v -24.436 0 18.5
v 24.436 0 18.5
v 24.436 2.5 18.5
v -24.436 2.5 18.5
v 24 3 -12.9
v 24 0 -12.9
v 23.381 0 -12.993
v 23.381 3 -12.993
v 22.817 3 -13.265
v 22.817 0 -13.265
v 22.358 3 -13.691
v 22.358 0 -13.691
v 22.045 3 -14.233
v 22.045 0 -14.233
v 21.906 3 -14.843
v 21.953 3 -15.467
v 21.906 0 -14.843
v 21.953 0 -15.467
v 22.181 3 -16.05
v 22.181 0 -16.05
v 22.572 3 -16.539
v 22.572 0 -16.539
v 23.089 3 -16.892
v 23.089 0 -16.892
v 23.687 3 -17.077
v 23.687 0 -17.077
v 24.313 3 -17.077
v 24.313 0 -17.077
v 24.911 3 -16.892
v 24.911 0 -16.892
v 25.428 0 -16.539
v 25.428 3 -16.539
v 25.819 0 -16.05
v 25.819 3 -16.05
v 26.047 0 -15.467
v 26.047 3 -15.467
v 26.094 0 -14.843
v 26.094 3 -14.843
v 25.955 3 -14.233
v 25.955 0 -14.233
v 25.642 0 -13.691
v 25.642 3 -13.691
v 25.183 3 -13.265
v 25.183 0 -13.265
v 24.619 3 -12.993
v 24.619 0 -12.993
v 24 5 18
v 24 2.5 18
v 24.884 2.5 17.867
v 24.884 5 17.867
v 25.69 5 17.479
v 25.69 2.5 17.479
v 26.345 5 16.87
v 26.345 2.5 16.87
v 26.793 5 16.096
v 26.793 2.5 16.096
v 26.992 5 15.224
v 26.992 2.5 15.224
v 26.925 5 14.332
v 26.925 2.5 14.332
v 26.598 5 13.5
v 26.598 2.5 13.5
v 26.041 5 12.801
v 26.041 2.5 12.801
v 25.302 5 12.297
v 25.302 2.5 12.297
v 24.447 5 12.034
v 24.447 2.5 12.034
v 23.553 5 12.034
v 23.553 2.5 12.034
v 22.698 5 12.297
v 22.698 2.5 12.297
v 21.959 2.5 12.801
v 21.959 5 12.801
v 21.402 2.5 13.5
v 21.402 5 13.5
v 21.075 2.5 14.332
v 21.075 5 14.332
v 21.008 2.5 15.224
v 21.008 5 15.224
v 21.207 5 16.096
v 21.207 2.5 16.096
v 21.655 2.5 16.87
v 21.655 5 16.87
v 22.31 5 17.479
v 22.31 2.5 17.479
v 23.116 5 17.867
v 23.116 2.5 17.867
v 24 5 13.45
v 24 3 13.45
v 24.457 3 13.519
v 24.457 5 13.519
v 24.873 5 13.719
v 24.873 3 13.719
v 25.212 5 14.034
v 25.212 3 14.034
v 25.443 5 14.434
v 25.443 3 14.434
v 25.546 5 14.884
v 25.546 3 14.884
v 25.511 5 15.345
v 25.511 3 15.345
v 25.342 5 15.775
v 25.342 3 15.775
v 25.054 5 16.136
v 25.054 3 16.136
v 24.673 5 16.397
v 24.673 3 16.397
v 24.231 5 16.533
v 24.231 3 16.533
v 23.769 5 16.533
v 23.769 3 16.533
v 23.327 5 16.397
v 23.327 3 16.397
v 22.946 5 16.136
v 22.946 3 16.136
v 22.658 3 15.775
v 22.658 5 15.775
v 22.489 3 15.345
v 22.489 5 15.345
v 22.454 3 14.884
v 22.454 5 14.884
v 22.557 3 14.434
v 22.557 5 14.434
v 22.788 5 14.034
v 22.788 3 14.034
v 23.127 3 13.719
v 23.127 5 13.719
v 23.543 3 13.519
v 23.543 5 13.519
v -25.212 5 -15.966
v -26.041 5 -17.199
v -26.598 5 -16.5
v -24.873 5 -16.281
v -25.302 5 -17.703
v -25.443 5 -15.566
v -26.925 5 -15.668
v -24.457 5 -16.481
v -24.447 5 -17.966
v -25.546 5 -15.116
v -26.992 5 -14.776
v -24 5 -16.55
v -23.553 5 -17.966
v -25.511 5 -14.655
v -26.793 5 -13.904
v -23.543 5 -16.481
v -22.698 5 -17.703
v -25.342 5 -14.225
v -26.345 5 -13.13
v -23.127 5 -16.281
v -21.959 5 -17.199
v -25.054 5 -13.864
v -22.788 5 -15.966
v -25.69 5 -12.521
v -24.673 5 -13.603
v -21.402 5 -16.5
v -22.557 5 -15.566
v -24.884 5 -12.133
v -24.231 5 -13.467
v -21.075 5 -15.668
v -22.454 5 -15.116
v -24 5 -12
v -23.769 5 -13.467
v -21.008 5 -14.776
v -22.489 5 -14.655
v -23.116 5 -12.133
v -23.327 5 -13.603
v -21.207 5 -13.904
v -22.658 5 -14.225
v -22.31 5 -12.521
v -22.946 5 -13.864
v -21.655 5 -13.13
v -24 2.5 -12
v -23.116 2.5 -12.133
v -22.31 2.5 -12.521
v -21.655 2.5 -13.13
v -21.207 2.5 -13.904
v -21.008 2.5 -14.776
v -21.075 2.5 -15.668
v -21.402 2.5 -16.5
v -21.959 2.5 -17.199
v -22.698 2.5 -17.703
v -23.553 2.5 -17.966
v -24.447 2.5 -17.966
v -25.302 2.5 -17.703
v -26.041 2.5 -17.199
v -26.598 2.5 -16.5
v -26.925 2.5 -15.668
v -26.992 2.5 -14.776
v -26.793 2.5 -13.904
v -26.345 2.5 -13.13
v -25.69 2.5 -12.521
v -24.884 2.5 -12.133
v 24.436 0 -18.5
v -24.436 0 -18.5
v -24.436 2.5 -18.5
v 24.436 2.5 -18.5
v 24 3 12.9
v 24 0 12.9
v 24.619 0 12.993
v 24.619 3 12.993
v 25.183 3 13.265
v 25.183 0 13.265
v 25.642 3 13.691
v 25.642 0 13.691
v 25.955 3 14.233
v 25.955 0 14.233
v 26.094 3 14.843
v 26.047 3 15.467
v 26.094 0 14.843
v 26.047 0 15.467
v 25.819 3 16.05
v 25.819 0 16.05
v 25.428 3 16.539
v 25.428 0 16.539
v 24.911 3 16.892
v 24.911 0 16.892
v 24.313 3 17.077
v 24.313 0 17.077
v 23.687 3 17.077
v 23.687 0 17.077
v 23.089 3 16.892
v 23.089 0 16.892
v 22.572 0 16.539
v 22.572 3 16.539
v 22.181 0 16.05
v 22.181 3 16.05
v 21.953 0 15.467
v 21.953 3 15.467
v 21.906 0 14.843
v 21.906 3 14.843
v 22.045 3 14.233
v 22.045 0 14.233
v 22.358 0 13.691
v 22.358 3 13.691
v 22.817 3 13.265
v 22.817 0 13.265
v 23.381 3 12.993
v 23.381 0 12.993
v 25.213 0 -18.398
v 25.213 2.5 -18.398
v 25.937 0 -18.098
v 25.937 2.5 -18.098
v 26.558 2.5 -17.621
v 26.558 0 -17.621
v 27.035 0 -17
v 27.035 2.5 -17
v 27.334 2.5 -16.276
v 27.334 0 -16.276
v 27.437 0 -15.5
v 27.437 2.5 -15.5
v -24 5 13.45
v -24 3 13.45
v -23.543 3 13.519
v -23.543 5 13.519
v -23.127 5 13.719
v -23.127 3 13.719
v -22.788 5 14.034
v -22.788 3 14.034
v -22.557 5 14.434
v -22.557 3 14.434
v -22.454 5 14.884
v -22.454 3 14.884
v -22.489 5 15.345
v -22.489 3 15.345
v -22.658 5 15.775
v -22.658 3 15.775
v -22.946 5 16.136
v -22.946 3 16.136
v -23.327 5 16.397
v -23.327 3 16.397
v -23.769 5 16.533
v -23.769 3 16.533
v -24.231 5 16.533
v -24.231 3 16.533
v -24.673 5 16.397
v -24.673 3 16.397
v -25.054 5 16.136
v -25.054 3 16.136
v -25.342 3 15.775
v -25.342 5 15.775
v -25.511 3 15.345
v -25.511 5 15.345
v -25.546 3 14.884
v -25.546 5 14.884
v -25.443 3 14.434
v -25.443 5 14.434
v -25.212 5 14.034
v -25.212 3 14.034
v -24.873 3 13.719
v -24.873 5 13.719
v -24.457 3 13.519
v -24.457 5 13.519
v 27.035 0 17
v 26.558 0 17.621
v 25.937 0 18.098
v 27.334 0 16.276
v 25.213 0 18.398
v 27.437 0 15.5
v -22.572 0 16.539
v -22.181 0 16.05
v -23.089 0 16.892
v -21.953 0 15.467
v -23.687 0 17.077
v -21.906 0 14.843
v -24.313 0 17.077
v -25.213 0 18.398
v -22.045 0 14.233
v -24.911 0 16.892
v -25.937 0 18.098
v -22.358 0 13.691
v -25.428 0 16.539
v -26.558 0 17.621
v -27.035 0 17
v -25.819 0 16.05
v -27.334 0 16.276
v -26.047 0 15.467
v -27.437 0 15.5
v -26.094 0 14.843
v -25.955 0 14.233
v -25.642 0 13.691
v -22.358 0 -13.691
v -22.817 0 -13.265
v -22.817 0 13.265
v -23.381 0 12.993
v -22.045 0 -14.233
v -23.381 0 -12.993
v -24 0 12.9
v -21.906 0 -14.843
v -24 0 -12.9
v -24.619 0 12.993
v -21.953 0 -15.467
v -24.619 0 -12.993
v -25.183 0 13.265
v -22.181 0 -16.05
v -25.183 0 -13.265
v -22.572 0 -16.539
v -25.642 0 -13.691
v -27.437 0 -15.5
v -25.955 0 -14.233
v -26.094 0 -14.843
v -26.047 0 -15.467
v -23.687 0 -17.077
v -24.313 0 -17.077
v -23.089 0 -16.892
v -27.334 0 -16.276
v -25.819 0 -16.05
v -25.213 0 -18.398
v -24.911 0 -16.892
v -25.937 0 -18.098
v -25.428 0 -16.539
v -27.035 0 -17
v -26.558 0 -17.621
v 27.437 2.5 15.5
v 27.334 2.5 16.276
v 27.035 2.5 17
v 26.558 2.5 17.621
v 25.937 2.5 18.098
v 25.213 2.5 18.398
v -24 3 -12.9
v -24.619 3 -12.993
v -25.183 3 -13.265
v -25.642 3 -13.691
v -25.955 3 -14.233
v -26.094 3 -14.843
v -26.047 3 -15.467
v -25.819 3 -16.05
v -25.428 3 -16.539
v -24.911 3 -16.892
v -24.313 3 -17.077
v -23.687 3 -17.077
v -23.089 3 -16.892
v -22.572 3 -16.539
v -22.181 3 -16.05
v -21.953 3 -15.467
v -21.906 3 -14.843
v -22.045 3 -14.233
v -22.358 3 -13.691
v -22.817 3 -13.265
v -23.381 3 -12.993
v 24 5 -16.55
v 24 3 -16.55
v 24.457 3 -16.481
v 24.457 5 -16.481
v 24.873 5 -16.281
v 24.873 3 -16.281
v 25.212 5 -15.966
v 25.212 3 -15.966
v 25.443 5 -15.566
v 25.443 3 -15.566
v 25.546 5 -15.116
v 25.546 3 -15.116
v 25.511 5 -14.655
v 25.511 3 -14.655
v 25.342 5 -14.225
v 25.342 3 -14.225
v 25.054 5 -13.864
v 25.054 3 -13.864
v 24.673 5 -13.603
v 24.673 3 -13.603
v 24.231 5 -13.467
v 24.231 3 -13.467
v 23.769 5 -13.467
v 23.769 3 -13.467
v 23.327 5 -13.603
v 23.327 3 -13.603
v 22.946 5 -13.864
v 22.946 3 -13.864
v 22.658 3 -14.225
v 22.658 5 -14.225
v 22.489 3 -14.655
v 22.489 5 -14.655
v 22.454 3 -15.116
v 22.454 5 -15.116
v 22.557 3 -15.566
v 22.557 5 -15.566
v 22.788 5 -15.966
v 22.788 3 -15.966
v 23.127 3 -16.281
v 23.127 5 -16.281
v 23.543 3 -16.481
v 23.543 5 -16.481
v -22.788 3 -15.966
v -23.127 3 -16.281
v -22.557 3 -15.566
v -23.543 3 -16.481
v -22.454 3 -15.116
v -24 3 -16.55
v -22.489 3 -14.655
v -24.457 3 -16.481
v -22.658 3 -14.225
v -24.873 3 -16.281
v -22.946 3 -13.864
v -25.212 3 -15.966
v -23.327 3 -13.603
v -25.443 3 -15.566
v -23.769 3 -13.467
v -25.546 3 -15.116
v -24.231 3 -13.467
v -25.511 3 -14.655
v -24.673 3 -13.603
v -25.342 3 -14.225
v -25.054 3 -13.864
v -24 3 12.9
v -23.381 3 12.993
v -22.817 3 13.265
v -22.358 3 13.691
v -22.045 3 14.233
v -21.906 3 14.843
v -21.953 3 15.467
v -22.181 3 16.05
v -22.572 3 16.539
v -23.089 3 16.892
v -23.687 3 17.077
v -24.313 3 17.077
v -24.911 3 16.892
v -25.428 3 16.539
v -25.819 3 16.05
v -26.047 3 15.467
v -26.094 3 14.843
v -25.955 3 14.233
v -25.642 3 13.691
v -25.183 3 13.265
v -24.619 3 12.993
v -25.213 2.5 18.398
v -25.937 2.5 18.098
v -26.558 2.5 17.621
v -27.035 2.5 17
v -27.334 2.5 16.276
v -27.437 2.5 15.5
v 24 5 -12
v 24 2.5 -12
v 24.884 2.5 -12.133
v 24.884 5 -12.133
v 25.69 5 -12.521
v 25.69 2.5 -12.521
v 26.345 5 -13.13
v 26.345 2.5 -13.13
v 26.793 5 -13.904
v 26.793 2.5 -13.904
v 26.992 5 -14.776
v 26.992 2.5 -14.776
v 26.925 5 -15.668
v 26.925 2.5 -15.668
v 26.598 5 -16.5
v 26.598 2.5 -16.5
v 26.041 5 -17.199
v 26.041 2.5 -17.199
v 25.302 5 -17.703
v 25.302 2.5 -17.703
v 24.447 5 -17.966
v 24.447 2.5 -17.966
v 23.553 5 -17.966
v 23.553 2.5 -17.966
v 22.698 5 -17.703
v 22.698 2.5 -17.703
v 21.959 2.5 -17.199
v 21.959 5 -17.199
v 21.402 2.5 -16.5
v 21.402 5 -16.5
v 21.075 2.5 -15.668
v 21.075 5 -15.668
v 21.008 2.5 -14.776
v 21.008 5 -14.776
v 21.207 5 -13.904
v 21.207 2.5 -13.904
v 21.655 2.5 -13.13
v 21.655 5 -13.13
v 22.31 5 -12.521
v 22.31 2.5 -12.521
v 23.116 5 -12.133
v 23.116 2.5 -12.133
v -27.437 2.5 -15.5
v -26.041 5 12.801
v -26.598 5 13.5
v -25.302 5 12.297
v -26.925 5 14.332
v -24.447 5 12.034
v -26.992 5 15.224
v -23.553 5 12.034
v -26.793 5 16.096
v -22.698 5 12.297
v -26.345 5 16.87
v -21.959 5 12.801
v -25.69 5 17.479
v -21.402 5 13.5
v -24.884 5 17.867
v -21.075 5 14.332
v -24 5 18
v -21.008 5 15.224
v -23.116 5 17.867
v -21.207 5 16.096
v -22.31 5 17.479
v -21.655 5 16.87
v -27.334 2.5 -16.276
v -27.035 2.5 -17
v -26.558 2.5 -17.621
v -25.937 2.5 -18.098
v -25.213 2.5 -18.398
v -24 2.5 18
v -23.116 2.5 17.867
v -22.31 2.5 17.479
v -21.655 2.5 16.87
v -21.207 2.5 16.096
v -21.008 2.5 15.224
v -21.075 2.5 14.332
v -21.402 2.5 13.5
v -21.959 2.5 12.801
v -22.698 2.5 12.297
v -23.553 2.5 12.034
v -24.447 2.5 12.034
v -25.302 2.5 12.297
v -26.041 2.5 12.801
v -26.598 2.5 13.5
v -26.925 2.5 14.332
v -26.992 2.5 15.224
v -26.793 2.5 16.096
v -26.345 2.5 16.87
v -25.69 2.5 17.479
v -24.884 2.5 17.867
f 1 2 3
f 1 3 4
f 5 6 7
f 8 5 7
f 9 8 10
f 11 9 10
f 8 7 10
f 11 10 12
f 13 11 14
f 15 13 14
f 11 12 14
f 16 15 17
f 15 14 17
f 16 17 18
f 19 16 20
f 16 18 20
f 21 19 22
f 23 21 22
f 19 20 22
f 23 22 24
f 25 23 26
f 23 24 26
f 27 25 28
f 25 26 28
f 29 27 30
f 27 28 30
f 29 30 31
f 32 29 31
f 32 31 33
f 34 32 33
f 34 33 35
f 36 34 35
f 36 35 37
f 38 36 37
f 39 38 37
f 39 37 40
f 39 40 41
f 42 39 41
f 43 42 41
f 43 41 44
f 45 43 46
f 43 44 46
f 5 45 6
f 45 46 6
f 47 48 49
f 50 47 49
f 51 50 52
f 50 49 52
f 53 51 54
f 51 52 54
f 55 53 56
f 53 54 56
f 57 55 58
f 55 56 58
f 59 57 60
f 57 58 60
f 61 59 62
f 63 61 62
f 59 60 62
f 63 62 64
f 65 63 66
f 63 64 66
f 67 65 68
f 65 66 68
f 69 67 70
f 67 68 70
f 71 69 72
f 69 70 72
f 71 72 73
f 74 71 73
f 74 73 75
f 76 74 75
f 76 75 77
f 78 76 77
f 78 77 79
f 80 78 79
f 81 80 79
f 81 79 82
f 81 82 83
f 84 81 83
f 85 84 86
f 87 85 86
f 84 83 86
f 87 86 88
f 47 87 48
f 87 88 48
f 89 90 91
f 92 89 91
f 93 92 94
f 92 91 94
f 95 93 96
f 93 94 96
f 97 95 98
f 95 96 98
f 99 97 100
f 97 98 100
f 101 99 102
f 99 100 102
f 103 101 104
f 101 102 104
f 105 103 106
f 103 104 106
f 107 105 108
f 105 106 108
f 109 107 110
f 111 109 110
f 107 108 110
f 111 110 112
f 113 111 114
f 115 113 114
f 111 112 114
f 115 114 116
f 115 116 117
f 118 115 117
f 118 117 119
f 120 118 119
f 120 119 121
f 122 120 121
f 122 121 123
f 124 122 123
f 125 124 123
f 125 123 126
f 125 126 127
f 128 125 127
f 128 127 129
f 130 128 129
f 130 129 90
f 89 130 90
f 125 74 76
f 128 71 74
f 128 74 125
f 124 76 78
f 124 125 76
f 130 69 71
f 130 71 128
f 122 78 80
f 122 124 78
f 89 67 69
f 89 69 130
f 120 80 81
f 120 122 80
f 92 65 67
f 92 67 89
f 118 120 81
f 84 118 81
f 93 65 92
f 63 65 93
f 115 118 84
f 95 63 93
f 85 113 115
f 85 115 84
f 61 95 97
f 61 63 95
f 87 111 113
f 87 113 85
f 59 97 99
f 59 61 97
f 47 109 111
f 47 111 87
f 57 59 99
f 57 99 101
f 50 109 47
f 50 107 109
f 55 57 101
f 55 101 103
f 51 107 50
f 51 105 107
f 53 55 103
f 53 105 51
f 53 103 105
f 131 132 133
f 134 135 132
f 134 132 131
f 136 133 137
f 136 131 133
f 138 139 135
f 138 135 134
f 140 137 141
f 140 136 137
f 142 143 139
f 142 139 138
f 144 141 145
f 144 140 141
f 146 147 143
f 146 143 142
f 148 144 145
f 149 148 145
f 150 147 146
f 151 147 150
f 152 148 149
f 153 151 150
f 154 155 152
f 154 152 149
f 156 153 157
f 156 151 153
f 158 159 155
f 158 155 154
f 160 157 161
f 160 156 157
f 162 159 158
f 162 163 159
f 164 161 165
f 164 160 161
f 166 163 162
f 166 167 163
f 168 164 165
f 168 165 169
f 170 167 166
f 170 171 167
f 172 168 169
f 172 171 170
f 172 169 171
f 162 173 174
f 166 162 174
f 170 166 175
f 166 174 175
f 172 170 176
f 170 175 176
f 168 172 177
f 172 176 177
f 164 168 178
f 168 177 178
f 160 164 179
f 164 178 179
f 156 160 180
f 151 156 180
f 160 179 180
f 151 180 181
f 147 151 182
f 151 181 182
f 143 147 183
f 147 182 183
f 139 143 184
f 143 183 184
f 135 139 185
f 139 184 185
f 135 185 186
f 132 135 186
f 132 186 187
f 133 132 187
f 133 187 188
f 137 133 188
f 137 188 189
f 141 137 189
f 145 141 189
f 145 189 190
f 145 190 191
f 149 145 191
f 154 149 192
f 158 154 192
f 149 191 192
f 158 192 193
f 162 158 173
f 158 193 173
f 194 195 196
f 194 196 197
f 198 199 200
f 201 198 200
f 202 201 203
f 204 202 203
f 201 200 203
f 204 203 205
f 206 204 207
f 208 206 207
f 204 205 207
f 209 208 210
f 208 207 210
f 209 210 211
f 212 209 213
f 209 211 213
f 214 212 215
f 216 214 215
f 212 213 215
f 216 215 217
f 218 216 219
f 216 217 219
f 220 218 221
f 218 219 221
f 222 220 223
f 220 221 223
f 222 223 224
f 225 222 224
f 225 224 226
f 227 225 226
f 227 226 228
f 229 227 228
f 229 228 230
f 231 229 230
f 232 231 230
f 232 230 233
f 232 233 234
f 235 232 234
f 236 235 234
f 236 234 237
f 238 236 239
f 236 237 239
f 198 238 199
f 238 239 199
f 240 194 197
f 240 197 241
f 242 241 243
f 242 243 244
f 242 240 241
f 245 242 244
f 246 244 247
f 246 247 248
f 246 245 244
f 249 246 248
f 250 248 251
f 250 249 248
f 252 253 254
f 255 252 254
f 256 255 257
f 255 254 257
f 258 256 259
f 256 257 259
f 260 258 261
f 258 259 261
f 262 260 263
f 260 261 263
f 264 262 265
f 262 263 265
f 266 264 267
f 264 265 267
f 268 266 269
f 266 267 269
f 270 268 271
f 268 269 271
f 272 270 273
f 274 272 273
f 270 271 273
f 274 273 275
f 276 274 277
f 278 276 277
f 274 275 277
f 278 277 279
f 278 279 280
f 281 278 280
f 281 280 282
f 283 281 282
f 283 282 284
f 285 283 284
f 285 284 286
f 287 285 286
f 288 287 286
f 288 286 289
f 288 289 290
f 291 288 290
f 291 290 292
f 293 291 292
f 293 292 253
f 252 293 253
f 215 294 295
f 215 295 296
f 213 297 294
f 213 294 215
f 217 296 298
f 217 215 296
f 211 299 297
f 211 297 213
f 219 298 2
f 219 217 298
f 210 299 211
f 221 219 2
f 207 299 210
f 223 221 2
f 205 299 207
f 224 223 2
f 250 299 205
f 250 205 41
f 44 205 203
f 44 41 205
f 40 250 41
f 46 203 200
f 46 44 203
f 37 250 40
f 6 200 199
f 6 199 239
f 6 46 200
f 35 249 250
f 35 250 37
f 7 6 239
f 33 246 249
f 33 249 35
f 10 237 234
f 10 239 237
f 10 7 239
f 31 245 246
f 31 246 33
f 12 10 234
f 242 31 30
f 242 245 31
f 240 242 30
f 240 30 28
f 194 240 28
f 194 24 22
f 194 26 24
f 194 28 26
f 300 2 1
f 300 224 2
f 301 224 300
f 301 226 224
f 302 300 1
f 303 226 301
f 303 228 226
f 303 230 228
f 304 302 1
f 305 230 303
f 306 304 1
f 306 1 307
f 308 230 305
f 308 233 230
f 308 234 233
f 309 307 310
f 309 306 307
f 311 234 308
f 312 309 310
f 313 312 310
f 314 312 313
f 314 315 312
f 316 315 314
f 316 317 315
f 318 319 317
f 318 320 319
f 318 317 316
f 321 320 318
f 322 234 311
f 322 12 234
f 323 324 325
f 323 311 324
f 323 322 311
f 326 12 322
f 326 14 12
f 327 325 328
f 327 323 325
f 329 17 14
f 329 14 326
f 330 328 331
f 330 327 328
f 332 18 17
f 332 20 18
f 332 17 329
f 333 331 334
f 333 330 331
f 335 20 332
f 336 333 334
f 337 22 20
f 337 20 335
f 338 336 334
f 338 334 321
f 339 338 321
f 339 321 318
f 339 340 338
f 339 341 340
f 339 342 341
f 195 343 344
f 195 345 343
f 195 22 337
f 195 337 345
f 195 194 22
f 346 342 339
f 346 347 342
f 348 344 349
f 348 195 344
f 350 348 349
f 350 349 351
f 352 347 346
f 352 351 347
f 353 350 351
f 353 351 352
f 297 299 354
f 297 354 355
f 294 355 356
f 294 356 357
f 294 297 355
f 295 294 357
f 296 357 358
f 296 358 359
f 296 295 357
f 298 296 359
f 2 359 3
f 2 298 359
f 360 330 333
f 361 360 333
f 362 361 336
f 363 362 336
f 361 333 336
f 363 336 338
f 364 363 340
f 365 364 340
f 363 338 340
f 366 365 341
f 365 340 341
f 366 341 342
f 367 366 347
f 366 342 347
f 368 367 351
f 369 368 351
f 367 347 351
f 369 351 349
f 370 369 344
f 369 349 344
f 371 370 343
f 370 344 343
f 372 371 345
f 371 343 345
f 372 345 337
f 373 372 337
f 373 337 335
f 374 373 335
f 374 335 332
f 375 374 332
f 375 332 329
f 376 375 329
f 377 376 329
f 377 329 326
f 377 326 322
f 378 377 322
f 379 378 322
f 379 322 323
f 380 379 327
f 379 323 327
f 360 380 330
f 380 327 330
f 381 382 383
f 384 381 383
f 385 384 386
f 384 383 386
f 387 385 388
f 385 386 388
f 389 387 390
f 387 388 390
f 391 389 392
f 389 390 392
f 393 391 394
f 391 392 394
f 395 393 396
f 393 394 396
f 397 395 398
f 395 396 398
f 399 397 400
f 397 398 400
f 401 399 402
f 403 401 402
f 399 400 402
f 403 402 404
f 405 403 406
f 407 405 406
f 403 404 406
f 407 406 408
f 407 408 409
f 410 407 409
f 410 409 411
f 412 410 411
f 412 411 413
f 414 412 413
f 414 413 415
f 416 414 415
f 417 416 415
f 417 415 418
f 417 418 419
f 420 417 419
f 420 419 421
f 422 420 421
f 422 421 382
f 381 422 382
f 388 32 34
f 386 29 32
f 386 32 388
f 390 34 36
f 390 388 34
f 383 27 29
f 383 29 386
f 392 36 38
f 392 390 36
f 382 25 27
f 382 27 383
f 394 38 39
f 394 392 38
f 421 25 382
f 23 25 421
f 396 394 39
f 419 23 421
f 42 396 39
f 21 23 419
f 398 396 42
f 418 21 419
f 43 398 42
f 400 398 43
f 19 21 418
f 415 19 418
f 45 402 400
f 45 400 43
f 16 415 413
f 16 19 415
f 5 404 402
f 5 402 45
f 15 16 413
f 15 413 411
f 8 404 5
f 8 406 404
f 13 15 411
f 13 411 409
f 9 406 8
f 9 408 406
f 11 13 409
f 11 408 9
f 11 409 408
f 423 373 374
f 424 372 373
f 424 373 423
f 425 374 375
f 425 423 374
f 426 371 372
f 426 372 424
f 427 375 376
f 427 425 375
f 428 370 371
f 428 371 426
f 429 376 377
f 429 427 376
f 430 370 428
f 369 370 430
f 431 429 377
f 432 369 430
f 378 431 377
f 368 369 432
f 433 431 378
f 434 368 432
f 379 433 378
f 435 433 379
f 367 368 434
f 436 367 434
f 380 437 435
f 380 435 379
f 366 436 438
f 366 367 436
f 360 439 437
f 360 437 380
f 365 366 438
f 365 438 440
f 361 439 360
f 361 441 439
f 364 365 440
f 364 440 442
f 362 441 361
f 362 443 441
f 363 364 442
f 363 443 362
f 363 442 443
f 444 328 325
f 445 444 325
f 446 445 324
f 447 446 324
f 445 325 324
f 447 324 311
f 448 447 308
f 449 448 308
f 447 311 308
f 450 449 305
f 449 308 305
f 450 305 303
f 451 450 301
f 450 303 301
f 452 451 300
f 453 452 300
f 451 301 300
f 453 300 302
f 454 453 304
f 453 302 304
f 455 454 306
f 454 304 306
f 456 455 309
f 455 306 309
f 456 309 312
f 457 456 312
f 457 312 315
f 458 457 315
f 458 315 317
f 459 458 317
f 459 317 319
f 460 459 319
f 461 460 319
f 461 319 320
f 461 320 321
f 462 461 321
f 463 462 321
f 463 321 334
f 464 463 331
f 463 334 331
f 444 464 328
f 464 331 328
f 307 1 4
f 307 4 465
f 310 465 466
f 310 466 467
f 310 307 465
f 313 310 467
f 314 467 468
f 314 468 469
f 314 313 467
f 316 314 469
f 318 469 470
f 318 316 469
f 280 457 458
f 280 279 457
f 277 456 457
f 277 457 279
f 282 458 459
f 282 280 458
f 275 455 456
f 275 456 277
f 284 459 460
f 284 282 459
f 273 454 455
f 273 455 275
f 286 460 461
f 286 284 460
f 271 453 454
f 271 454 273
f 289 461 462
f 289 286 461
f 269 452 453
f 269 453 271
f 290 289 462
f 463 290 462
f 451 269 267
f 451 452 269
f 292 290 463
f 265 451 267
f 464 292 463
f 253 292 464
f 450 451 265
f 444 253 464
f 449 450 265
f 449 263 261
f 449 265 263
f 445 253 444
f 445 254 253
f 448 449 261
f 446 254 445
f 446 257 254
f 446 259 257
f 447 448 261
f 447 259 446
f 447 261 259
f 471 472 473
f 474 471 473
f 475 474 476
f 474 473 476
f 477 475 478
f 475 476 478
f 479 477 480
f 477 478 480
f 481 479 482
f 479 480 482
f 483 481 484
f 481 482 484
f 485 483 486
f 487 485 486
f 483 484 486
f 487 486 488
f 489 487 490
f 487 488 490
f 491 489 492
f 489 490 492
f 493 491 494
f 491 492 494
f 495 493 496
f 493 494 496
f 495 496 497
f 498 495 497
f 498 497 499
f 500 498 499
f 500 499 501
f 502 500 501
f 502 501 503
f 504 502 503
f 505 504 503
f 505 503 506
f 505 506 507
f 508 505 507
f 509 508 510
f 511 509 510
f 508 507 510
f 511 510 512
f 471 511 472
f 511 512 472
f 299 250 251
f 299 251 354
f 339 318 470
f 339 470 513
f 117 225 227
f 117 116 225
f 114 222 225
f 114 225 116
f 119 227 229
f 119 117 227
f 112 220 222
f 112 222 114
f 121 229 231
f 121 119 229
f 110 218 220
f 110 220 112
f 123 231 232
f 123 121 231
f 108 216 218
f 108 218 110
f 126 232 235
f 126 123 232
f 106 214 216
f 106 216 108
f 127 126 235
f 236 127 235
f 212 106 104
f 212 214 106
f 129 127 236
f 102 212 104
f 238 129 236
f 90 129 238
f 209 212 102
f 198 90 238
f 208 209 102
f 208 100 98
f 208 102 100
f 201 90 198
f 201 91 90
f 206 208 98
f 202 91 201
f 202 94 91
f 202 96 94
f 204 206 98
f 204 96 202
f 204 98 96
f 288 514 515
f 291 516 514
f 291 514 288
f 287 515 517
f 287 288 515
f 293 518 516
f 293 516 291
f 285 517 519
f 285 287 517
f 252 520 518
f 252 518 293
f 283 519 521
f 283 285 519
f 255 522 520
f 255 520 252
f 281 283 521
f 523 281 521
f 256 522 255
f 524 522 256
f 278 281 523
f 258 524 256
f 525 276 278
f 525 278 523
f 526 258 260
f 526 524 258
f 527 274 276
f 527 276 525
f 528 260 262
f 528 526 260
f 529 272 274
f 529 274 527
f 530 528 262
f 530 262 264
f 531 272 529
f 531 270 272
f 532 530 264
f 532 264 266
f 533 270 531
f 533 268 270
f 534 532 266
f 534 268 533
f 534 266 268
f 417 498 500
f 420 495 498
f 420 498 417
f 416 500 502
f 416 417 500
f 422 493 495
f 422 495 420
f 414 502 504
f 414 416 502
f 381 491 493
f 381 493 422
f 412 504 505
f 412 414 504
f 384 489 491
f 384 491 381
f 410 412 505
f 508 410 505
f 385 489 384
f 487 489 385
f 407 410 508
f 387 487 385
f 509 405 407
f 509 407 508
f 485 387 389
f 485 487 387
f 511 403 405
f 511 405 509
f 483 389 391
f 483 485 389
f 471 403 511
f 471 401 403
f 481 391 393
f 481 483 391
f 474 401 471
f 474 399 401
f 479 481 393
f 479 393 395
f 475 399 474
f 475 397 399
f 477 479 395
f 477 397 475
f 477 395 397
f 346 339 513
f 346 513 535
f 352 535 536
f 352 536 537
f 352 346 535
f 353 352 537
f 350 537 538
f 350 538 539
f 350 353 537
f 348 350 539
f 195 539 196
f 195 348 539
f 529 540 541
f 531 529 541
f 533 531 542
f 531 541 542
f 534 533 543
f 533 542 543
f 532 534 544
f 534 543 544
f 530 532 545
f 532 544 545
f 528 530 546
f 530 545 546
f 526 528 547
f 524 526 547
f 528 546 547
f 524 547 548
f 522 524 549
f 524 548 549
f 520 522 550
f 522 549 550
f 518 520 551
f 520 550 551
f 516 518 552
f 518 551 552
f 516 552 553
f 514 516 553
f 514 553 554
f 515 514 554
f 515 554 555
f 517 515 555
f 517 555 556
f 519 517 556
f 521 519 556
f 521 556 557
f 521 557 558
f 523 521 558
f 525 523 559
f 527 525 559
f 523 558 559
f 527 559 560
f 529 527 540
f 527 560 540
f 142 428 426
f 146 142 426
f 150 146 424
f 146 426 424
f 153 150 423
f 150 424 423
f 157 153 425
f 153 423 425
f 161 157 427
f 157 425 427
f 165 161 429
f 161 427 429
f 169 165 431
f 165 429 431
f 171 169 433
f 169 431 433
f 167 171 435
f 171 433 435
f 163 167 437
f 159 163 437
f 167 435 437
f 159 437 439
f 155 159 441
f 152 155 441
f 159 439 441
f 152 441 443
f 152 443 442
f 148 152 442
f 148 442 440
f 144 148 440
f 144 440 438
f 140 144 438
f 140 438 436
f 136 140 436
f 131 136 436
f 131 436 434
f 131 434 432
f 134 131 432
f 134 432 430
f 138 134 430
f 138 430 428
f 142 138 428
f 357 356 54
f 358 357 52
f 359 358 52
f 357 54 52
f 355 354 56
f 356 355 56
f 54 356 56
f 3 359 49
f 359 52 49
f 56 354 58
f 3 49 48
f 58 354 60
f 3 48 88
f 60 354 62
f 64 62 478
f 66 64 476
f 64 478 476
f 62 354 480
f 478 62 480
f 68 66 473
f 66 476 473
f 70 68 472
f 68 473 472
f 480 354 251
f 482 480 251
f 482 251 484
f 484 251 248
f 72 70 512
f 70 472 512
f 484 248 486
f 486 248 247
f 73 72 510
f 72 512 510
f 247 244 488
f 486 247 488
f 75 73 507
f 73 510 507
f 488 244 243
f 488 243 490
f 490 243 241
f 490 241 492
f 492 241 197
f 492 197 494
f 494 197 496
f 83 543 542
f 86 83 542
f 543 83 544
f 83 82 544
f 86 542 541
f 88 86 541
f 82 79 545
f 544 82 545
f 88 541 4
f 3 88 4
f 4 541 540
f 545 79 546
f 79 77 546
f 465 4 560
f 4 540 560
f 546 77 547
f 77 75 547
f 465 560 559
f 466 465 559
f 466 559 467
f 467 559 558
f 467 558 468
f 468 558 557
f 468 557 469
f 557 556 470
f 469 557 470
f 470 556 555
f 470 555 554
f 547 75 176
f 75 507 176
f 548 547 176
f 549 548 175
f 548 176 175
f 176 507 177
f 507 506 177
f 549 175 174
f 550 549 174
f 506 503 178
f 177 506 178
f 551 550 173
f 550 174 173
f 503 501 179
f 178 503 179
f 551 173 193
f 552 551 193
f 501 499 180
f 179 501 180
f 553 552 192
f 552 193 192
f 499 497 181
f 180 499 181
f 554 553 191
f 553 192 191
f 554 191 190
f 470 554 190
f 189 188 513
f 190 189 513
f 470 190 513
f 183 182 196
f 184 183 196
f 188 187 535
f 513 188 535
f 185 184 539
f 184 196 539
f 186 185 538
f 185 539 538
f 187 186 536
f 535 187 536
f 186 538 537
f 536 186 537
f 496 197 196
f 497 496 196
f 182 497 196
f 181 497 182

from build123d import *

# Parameters (mm, degrees)
SKETCH_1_R          = 1.55
EXTRUDE_1_DEPTH     = 2.5
SKETCH_2_R          = 3
EXTRUDE_2_DEPTH     = 2.5
SKETCH_3_R          = 1.55
CUT_EXTRUDE_1_DEPTH = 34.466573357
SKETCH_4_R          = 2.1
CUT_EXTRUDE_2_DEPTH = 3


with BuildPart() as part:
    # 草图1 → 凸台-拉伸1 (new body)
    with BuildSketch(Plane(origin=(0, 0, 0), x_dir=(1, 0, 0), z_dir=(0, 1, 0))):
        with BuildLine():
            Line((-27.4365, 0), (-27.4365, 15.5))
            ThreePointArc((-27.4365, 15.5), (-26.557820344, 17.621320344), (-24.4365, 18.5))
            Line((-24.4365, 18.5), (0, 18.5))
            Line((0, 18.5), (24.4365, 18.5))
            ThreePointArc((24.4365, 18.5), (26.557820344, 17.621320344), (27.4365, 15.5))
            Line((27.4365, 15.5), (27.4365, 0))
            Line((27.4365, 0), (27.4365, -15.5))
            ThreePointArc((27.4365, -15.5), (26.557820344, -17.621320344), (24.4365, -18.5))
            Line((24.4365, -18.5), (0, -18.5))
            Line((0, -18.5), (-24.4365, -18.5))
            ThreePointArc((-24.4365, -18.5), (-26.557820344, -17.621320344), (-27.4365, -15.5))
            Line((-27.4365, -15.5), (-27.4365, 0))
        make_face()
        with Locations((-24, 15)):
            Circle(SKETCH_1_R, mode=Mode.SUBTRACT)
        with Locations((24, 15)):
            Circle(SKETCH_1_R, mode=Mode.SUBTRACT)
        with Locations((24, -15)):
            Circle(SKETCH_1_R, mode=Mode.SUBTRACT)
        with Locations((-24, -15)):
            Circle(SKETCH_1_R, mode=Mode.SUBTRACT)
    extrude(amount=EXTRUDE_1_DEPTH)

    # 草图2 → 凸台-拉伸2 (add)
    with BuildSketch(Plane(origin=(0, 2.5, 0), x_dir=(1, 0, 0), z_dir=(0, 1, 0))):
        with Locations((-24, 15)):
            Circle(SKETCH_2_R)
        with Locations((24, 15)):
            Circle(SKETCH_2_R)
        with Locations((-24, -15)):
            Circle(SKETCH_2_R)
        with Locations((24, -15)):
            Circle(SKETCH_2_R)
    extrude(amount=EXTRUDE_2_DEPTH)

    # 草图3 → 切除-拉伸1 (cut, through all)
    with BuildSketch(Plane.XZ):
        with Locations((-24, 15)):
            Circle(SKETCH_3_R)
        with Locations((24, 15)):
            Circle(SKETCH_3_R)
        with Locations((-24, -15)):
            Circle(SKETCH_3_R)
        with Locations((24, -15)):
            Circle(SKETCH_3_R)
    extrude(amount=-CUT_EXTRUDE_1_DEPTH, mode=Mode.SUBTRACT)

    # 草图4 → 切除-拉伸2 (cut)
    with BuildSketch(Plane(origin=(0, 0, 0), x_dir=(-1, 0, 0), z_dir=(0, -1, 0))):
        with Locations((24, -15)):
            Circle(SKETCH_4_R)
        with Locations((-24, -15)):
            Circle(SKETCH_4_R)
        with Locations((-24, 15)):
            Circle(SKETCH_4_R)
        with Locations((24, 15)):
            Circle(SKETCH_4_R)
    extrude(amount=-CUT_EXTRUDE_2_DEPTH, mode=Mode.SUBTRACT)


solid = part.part
